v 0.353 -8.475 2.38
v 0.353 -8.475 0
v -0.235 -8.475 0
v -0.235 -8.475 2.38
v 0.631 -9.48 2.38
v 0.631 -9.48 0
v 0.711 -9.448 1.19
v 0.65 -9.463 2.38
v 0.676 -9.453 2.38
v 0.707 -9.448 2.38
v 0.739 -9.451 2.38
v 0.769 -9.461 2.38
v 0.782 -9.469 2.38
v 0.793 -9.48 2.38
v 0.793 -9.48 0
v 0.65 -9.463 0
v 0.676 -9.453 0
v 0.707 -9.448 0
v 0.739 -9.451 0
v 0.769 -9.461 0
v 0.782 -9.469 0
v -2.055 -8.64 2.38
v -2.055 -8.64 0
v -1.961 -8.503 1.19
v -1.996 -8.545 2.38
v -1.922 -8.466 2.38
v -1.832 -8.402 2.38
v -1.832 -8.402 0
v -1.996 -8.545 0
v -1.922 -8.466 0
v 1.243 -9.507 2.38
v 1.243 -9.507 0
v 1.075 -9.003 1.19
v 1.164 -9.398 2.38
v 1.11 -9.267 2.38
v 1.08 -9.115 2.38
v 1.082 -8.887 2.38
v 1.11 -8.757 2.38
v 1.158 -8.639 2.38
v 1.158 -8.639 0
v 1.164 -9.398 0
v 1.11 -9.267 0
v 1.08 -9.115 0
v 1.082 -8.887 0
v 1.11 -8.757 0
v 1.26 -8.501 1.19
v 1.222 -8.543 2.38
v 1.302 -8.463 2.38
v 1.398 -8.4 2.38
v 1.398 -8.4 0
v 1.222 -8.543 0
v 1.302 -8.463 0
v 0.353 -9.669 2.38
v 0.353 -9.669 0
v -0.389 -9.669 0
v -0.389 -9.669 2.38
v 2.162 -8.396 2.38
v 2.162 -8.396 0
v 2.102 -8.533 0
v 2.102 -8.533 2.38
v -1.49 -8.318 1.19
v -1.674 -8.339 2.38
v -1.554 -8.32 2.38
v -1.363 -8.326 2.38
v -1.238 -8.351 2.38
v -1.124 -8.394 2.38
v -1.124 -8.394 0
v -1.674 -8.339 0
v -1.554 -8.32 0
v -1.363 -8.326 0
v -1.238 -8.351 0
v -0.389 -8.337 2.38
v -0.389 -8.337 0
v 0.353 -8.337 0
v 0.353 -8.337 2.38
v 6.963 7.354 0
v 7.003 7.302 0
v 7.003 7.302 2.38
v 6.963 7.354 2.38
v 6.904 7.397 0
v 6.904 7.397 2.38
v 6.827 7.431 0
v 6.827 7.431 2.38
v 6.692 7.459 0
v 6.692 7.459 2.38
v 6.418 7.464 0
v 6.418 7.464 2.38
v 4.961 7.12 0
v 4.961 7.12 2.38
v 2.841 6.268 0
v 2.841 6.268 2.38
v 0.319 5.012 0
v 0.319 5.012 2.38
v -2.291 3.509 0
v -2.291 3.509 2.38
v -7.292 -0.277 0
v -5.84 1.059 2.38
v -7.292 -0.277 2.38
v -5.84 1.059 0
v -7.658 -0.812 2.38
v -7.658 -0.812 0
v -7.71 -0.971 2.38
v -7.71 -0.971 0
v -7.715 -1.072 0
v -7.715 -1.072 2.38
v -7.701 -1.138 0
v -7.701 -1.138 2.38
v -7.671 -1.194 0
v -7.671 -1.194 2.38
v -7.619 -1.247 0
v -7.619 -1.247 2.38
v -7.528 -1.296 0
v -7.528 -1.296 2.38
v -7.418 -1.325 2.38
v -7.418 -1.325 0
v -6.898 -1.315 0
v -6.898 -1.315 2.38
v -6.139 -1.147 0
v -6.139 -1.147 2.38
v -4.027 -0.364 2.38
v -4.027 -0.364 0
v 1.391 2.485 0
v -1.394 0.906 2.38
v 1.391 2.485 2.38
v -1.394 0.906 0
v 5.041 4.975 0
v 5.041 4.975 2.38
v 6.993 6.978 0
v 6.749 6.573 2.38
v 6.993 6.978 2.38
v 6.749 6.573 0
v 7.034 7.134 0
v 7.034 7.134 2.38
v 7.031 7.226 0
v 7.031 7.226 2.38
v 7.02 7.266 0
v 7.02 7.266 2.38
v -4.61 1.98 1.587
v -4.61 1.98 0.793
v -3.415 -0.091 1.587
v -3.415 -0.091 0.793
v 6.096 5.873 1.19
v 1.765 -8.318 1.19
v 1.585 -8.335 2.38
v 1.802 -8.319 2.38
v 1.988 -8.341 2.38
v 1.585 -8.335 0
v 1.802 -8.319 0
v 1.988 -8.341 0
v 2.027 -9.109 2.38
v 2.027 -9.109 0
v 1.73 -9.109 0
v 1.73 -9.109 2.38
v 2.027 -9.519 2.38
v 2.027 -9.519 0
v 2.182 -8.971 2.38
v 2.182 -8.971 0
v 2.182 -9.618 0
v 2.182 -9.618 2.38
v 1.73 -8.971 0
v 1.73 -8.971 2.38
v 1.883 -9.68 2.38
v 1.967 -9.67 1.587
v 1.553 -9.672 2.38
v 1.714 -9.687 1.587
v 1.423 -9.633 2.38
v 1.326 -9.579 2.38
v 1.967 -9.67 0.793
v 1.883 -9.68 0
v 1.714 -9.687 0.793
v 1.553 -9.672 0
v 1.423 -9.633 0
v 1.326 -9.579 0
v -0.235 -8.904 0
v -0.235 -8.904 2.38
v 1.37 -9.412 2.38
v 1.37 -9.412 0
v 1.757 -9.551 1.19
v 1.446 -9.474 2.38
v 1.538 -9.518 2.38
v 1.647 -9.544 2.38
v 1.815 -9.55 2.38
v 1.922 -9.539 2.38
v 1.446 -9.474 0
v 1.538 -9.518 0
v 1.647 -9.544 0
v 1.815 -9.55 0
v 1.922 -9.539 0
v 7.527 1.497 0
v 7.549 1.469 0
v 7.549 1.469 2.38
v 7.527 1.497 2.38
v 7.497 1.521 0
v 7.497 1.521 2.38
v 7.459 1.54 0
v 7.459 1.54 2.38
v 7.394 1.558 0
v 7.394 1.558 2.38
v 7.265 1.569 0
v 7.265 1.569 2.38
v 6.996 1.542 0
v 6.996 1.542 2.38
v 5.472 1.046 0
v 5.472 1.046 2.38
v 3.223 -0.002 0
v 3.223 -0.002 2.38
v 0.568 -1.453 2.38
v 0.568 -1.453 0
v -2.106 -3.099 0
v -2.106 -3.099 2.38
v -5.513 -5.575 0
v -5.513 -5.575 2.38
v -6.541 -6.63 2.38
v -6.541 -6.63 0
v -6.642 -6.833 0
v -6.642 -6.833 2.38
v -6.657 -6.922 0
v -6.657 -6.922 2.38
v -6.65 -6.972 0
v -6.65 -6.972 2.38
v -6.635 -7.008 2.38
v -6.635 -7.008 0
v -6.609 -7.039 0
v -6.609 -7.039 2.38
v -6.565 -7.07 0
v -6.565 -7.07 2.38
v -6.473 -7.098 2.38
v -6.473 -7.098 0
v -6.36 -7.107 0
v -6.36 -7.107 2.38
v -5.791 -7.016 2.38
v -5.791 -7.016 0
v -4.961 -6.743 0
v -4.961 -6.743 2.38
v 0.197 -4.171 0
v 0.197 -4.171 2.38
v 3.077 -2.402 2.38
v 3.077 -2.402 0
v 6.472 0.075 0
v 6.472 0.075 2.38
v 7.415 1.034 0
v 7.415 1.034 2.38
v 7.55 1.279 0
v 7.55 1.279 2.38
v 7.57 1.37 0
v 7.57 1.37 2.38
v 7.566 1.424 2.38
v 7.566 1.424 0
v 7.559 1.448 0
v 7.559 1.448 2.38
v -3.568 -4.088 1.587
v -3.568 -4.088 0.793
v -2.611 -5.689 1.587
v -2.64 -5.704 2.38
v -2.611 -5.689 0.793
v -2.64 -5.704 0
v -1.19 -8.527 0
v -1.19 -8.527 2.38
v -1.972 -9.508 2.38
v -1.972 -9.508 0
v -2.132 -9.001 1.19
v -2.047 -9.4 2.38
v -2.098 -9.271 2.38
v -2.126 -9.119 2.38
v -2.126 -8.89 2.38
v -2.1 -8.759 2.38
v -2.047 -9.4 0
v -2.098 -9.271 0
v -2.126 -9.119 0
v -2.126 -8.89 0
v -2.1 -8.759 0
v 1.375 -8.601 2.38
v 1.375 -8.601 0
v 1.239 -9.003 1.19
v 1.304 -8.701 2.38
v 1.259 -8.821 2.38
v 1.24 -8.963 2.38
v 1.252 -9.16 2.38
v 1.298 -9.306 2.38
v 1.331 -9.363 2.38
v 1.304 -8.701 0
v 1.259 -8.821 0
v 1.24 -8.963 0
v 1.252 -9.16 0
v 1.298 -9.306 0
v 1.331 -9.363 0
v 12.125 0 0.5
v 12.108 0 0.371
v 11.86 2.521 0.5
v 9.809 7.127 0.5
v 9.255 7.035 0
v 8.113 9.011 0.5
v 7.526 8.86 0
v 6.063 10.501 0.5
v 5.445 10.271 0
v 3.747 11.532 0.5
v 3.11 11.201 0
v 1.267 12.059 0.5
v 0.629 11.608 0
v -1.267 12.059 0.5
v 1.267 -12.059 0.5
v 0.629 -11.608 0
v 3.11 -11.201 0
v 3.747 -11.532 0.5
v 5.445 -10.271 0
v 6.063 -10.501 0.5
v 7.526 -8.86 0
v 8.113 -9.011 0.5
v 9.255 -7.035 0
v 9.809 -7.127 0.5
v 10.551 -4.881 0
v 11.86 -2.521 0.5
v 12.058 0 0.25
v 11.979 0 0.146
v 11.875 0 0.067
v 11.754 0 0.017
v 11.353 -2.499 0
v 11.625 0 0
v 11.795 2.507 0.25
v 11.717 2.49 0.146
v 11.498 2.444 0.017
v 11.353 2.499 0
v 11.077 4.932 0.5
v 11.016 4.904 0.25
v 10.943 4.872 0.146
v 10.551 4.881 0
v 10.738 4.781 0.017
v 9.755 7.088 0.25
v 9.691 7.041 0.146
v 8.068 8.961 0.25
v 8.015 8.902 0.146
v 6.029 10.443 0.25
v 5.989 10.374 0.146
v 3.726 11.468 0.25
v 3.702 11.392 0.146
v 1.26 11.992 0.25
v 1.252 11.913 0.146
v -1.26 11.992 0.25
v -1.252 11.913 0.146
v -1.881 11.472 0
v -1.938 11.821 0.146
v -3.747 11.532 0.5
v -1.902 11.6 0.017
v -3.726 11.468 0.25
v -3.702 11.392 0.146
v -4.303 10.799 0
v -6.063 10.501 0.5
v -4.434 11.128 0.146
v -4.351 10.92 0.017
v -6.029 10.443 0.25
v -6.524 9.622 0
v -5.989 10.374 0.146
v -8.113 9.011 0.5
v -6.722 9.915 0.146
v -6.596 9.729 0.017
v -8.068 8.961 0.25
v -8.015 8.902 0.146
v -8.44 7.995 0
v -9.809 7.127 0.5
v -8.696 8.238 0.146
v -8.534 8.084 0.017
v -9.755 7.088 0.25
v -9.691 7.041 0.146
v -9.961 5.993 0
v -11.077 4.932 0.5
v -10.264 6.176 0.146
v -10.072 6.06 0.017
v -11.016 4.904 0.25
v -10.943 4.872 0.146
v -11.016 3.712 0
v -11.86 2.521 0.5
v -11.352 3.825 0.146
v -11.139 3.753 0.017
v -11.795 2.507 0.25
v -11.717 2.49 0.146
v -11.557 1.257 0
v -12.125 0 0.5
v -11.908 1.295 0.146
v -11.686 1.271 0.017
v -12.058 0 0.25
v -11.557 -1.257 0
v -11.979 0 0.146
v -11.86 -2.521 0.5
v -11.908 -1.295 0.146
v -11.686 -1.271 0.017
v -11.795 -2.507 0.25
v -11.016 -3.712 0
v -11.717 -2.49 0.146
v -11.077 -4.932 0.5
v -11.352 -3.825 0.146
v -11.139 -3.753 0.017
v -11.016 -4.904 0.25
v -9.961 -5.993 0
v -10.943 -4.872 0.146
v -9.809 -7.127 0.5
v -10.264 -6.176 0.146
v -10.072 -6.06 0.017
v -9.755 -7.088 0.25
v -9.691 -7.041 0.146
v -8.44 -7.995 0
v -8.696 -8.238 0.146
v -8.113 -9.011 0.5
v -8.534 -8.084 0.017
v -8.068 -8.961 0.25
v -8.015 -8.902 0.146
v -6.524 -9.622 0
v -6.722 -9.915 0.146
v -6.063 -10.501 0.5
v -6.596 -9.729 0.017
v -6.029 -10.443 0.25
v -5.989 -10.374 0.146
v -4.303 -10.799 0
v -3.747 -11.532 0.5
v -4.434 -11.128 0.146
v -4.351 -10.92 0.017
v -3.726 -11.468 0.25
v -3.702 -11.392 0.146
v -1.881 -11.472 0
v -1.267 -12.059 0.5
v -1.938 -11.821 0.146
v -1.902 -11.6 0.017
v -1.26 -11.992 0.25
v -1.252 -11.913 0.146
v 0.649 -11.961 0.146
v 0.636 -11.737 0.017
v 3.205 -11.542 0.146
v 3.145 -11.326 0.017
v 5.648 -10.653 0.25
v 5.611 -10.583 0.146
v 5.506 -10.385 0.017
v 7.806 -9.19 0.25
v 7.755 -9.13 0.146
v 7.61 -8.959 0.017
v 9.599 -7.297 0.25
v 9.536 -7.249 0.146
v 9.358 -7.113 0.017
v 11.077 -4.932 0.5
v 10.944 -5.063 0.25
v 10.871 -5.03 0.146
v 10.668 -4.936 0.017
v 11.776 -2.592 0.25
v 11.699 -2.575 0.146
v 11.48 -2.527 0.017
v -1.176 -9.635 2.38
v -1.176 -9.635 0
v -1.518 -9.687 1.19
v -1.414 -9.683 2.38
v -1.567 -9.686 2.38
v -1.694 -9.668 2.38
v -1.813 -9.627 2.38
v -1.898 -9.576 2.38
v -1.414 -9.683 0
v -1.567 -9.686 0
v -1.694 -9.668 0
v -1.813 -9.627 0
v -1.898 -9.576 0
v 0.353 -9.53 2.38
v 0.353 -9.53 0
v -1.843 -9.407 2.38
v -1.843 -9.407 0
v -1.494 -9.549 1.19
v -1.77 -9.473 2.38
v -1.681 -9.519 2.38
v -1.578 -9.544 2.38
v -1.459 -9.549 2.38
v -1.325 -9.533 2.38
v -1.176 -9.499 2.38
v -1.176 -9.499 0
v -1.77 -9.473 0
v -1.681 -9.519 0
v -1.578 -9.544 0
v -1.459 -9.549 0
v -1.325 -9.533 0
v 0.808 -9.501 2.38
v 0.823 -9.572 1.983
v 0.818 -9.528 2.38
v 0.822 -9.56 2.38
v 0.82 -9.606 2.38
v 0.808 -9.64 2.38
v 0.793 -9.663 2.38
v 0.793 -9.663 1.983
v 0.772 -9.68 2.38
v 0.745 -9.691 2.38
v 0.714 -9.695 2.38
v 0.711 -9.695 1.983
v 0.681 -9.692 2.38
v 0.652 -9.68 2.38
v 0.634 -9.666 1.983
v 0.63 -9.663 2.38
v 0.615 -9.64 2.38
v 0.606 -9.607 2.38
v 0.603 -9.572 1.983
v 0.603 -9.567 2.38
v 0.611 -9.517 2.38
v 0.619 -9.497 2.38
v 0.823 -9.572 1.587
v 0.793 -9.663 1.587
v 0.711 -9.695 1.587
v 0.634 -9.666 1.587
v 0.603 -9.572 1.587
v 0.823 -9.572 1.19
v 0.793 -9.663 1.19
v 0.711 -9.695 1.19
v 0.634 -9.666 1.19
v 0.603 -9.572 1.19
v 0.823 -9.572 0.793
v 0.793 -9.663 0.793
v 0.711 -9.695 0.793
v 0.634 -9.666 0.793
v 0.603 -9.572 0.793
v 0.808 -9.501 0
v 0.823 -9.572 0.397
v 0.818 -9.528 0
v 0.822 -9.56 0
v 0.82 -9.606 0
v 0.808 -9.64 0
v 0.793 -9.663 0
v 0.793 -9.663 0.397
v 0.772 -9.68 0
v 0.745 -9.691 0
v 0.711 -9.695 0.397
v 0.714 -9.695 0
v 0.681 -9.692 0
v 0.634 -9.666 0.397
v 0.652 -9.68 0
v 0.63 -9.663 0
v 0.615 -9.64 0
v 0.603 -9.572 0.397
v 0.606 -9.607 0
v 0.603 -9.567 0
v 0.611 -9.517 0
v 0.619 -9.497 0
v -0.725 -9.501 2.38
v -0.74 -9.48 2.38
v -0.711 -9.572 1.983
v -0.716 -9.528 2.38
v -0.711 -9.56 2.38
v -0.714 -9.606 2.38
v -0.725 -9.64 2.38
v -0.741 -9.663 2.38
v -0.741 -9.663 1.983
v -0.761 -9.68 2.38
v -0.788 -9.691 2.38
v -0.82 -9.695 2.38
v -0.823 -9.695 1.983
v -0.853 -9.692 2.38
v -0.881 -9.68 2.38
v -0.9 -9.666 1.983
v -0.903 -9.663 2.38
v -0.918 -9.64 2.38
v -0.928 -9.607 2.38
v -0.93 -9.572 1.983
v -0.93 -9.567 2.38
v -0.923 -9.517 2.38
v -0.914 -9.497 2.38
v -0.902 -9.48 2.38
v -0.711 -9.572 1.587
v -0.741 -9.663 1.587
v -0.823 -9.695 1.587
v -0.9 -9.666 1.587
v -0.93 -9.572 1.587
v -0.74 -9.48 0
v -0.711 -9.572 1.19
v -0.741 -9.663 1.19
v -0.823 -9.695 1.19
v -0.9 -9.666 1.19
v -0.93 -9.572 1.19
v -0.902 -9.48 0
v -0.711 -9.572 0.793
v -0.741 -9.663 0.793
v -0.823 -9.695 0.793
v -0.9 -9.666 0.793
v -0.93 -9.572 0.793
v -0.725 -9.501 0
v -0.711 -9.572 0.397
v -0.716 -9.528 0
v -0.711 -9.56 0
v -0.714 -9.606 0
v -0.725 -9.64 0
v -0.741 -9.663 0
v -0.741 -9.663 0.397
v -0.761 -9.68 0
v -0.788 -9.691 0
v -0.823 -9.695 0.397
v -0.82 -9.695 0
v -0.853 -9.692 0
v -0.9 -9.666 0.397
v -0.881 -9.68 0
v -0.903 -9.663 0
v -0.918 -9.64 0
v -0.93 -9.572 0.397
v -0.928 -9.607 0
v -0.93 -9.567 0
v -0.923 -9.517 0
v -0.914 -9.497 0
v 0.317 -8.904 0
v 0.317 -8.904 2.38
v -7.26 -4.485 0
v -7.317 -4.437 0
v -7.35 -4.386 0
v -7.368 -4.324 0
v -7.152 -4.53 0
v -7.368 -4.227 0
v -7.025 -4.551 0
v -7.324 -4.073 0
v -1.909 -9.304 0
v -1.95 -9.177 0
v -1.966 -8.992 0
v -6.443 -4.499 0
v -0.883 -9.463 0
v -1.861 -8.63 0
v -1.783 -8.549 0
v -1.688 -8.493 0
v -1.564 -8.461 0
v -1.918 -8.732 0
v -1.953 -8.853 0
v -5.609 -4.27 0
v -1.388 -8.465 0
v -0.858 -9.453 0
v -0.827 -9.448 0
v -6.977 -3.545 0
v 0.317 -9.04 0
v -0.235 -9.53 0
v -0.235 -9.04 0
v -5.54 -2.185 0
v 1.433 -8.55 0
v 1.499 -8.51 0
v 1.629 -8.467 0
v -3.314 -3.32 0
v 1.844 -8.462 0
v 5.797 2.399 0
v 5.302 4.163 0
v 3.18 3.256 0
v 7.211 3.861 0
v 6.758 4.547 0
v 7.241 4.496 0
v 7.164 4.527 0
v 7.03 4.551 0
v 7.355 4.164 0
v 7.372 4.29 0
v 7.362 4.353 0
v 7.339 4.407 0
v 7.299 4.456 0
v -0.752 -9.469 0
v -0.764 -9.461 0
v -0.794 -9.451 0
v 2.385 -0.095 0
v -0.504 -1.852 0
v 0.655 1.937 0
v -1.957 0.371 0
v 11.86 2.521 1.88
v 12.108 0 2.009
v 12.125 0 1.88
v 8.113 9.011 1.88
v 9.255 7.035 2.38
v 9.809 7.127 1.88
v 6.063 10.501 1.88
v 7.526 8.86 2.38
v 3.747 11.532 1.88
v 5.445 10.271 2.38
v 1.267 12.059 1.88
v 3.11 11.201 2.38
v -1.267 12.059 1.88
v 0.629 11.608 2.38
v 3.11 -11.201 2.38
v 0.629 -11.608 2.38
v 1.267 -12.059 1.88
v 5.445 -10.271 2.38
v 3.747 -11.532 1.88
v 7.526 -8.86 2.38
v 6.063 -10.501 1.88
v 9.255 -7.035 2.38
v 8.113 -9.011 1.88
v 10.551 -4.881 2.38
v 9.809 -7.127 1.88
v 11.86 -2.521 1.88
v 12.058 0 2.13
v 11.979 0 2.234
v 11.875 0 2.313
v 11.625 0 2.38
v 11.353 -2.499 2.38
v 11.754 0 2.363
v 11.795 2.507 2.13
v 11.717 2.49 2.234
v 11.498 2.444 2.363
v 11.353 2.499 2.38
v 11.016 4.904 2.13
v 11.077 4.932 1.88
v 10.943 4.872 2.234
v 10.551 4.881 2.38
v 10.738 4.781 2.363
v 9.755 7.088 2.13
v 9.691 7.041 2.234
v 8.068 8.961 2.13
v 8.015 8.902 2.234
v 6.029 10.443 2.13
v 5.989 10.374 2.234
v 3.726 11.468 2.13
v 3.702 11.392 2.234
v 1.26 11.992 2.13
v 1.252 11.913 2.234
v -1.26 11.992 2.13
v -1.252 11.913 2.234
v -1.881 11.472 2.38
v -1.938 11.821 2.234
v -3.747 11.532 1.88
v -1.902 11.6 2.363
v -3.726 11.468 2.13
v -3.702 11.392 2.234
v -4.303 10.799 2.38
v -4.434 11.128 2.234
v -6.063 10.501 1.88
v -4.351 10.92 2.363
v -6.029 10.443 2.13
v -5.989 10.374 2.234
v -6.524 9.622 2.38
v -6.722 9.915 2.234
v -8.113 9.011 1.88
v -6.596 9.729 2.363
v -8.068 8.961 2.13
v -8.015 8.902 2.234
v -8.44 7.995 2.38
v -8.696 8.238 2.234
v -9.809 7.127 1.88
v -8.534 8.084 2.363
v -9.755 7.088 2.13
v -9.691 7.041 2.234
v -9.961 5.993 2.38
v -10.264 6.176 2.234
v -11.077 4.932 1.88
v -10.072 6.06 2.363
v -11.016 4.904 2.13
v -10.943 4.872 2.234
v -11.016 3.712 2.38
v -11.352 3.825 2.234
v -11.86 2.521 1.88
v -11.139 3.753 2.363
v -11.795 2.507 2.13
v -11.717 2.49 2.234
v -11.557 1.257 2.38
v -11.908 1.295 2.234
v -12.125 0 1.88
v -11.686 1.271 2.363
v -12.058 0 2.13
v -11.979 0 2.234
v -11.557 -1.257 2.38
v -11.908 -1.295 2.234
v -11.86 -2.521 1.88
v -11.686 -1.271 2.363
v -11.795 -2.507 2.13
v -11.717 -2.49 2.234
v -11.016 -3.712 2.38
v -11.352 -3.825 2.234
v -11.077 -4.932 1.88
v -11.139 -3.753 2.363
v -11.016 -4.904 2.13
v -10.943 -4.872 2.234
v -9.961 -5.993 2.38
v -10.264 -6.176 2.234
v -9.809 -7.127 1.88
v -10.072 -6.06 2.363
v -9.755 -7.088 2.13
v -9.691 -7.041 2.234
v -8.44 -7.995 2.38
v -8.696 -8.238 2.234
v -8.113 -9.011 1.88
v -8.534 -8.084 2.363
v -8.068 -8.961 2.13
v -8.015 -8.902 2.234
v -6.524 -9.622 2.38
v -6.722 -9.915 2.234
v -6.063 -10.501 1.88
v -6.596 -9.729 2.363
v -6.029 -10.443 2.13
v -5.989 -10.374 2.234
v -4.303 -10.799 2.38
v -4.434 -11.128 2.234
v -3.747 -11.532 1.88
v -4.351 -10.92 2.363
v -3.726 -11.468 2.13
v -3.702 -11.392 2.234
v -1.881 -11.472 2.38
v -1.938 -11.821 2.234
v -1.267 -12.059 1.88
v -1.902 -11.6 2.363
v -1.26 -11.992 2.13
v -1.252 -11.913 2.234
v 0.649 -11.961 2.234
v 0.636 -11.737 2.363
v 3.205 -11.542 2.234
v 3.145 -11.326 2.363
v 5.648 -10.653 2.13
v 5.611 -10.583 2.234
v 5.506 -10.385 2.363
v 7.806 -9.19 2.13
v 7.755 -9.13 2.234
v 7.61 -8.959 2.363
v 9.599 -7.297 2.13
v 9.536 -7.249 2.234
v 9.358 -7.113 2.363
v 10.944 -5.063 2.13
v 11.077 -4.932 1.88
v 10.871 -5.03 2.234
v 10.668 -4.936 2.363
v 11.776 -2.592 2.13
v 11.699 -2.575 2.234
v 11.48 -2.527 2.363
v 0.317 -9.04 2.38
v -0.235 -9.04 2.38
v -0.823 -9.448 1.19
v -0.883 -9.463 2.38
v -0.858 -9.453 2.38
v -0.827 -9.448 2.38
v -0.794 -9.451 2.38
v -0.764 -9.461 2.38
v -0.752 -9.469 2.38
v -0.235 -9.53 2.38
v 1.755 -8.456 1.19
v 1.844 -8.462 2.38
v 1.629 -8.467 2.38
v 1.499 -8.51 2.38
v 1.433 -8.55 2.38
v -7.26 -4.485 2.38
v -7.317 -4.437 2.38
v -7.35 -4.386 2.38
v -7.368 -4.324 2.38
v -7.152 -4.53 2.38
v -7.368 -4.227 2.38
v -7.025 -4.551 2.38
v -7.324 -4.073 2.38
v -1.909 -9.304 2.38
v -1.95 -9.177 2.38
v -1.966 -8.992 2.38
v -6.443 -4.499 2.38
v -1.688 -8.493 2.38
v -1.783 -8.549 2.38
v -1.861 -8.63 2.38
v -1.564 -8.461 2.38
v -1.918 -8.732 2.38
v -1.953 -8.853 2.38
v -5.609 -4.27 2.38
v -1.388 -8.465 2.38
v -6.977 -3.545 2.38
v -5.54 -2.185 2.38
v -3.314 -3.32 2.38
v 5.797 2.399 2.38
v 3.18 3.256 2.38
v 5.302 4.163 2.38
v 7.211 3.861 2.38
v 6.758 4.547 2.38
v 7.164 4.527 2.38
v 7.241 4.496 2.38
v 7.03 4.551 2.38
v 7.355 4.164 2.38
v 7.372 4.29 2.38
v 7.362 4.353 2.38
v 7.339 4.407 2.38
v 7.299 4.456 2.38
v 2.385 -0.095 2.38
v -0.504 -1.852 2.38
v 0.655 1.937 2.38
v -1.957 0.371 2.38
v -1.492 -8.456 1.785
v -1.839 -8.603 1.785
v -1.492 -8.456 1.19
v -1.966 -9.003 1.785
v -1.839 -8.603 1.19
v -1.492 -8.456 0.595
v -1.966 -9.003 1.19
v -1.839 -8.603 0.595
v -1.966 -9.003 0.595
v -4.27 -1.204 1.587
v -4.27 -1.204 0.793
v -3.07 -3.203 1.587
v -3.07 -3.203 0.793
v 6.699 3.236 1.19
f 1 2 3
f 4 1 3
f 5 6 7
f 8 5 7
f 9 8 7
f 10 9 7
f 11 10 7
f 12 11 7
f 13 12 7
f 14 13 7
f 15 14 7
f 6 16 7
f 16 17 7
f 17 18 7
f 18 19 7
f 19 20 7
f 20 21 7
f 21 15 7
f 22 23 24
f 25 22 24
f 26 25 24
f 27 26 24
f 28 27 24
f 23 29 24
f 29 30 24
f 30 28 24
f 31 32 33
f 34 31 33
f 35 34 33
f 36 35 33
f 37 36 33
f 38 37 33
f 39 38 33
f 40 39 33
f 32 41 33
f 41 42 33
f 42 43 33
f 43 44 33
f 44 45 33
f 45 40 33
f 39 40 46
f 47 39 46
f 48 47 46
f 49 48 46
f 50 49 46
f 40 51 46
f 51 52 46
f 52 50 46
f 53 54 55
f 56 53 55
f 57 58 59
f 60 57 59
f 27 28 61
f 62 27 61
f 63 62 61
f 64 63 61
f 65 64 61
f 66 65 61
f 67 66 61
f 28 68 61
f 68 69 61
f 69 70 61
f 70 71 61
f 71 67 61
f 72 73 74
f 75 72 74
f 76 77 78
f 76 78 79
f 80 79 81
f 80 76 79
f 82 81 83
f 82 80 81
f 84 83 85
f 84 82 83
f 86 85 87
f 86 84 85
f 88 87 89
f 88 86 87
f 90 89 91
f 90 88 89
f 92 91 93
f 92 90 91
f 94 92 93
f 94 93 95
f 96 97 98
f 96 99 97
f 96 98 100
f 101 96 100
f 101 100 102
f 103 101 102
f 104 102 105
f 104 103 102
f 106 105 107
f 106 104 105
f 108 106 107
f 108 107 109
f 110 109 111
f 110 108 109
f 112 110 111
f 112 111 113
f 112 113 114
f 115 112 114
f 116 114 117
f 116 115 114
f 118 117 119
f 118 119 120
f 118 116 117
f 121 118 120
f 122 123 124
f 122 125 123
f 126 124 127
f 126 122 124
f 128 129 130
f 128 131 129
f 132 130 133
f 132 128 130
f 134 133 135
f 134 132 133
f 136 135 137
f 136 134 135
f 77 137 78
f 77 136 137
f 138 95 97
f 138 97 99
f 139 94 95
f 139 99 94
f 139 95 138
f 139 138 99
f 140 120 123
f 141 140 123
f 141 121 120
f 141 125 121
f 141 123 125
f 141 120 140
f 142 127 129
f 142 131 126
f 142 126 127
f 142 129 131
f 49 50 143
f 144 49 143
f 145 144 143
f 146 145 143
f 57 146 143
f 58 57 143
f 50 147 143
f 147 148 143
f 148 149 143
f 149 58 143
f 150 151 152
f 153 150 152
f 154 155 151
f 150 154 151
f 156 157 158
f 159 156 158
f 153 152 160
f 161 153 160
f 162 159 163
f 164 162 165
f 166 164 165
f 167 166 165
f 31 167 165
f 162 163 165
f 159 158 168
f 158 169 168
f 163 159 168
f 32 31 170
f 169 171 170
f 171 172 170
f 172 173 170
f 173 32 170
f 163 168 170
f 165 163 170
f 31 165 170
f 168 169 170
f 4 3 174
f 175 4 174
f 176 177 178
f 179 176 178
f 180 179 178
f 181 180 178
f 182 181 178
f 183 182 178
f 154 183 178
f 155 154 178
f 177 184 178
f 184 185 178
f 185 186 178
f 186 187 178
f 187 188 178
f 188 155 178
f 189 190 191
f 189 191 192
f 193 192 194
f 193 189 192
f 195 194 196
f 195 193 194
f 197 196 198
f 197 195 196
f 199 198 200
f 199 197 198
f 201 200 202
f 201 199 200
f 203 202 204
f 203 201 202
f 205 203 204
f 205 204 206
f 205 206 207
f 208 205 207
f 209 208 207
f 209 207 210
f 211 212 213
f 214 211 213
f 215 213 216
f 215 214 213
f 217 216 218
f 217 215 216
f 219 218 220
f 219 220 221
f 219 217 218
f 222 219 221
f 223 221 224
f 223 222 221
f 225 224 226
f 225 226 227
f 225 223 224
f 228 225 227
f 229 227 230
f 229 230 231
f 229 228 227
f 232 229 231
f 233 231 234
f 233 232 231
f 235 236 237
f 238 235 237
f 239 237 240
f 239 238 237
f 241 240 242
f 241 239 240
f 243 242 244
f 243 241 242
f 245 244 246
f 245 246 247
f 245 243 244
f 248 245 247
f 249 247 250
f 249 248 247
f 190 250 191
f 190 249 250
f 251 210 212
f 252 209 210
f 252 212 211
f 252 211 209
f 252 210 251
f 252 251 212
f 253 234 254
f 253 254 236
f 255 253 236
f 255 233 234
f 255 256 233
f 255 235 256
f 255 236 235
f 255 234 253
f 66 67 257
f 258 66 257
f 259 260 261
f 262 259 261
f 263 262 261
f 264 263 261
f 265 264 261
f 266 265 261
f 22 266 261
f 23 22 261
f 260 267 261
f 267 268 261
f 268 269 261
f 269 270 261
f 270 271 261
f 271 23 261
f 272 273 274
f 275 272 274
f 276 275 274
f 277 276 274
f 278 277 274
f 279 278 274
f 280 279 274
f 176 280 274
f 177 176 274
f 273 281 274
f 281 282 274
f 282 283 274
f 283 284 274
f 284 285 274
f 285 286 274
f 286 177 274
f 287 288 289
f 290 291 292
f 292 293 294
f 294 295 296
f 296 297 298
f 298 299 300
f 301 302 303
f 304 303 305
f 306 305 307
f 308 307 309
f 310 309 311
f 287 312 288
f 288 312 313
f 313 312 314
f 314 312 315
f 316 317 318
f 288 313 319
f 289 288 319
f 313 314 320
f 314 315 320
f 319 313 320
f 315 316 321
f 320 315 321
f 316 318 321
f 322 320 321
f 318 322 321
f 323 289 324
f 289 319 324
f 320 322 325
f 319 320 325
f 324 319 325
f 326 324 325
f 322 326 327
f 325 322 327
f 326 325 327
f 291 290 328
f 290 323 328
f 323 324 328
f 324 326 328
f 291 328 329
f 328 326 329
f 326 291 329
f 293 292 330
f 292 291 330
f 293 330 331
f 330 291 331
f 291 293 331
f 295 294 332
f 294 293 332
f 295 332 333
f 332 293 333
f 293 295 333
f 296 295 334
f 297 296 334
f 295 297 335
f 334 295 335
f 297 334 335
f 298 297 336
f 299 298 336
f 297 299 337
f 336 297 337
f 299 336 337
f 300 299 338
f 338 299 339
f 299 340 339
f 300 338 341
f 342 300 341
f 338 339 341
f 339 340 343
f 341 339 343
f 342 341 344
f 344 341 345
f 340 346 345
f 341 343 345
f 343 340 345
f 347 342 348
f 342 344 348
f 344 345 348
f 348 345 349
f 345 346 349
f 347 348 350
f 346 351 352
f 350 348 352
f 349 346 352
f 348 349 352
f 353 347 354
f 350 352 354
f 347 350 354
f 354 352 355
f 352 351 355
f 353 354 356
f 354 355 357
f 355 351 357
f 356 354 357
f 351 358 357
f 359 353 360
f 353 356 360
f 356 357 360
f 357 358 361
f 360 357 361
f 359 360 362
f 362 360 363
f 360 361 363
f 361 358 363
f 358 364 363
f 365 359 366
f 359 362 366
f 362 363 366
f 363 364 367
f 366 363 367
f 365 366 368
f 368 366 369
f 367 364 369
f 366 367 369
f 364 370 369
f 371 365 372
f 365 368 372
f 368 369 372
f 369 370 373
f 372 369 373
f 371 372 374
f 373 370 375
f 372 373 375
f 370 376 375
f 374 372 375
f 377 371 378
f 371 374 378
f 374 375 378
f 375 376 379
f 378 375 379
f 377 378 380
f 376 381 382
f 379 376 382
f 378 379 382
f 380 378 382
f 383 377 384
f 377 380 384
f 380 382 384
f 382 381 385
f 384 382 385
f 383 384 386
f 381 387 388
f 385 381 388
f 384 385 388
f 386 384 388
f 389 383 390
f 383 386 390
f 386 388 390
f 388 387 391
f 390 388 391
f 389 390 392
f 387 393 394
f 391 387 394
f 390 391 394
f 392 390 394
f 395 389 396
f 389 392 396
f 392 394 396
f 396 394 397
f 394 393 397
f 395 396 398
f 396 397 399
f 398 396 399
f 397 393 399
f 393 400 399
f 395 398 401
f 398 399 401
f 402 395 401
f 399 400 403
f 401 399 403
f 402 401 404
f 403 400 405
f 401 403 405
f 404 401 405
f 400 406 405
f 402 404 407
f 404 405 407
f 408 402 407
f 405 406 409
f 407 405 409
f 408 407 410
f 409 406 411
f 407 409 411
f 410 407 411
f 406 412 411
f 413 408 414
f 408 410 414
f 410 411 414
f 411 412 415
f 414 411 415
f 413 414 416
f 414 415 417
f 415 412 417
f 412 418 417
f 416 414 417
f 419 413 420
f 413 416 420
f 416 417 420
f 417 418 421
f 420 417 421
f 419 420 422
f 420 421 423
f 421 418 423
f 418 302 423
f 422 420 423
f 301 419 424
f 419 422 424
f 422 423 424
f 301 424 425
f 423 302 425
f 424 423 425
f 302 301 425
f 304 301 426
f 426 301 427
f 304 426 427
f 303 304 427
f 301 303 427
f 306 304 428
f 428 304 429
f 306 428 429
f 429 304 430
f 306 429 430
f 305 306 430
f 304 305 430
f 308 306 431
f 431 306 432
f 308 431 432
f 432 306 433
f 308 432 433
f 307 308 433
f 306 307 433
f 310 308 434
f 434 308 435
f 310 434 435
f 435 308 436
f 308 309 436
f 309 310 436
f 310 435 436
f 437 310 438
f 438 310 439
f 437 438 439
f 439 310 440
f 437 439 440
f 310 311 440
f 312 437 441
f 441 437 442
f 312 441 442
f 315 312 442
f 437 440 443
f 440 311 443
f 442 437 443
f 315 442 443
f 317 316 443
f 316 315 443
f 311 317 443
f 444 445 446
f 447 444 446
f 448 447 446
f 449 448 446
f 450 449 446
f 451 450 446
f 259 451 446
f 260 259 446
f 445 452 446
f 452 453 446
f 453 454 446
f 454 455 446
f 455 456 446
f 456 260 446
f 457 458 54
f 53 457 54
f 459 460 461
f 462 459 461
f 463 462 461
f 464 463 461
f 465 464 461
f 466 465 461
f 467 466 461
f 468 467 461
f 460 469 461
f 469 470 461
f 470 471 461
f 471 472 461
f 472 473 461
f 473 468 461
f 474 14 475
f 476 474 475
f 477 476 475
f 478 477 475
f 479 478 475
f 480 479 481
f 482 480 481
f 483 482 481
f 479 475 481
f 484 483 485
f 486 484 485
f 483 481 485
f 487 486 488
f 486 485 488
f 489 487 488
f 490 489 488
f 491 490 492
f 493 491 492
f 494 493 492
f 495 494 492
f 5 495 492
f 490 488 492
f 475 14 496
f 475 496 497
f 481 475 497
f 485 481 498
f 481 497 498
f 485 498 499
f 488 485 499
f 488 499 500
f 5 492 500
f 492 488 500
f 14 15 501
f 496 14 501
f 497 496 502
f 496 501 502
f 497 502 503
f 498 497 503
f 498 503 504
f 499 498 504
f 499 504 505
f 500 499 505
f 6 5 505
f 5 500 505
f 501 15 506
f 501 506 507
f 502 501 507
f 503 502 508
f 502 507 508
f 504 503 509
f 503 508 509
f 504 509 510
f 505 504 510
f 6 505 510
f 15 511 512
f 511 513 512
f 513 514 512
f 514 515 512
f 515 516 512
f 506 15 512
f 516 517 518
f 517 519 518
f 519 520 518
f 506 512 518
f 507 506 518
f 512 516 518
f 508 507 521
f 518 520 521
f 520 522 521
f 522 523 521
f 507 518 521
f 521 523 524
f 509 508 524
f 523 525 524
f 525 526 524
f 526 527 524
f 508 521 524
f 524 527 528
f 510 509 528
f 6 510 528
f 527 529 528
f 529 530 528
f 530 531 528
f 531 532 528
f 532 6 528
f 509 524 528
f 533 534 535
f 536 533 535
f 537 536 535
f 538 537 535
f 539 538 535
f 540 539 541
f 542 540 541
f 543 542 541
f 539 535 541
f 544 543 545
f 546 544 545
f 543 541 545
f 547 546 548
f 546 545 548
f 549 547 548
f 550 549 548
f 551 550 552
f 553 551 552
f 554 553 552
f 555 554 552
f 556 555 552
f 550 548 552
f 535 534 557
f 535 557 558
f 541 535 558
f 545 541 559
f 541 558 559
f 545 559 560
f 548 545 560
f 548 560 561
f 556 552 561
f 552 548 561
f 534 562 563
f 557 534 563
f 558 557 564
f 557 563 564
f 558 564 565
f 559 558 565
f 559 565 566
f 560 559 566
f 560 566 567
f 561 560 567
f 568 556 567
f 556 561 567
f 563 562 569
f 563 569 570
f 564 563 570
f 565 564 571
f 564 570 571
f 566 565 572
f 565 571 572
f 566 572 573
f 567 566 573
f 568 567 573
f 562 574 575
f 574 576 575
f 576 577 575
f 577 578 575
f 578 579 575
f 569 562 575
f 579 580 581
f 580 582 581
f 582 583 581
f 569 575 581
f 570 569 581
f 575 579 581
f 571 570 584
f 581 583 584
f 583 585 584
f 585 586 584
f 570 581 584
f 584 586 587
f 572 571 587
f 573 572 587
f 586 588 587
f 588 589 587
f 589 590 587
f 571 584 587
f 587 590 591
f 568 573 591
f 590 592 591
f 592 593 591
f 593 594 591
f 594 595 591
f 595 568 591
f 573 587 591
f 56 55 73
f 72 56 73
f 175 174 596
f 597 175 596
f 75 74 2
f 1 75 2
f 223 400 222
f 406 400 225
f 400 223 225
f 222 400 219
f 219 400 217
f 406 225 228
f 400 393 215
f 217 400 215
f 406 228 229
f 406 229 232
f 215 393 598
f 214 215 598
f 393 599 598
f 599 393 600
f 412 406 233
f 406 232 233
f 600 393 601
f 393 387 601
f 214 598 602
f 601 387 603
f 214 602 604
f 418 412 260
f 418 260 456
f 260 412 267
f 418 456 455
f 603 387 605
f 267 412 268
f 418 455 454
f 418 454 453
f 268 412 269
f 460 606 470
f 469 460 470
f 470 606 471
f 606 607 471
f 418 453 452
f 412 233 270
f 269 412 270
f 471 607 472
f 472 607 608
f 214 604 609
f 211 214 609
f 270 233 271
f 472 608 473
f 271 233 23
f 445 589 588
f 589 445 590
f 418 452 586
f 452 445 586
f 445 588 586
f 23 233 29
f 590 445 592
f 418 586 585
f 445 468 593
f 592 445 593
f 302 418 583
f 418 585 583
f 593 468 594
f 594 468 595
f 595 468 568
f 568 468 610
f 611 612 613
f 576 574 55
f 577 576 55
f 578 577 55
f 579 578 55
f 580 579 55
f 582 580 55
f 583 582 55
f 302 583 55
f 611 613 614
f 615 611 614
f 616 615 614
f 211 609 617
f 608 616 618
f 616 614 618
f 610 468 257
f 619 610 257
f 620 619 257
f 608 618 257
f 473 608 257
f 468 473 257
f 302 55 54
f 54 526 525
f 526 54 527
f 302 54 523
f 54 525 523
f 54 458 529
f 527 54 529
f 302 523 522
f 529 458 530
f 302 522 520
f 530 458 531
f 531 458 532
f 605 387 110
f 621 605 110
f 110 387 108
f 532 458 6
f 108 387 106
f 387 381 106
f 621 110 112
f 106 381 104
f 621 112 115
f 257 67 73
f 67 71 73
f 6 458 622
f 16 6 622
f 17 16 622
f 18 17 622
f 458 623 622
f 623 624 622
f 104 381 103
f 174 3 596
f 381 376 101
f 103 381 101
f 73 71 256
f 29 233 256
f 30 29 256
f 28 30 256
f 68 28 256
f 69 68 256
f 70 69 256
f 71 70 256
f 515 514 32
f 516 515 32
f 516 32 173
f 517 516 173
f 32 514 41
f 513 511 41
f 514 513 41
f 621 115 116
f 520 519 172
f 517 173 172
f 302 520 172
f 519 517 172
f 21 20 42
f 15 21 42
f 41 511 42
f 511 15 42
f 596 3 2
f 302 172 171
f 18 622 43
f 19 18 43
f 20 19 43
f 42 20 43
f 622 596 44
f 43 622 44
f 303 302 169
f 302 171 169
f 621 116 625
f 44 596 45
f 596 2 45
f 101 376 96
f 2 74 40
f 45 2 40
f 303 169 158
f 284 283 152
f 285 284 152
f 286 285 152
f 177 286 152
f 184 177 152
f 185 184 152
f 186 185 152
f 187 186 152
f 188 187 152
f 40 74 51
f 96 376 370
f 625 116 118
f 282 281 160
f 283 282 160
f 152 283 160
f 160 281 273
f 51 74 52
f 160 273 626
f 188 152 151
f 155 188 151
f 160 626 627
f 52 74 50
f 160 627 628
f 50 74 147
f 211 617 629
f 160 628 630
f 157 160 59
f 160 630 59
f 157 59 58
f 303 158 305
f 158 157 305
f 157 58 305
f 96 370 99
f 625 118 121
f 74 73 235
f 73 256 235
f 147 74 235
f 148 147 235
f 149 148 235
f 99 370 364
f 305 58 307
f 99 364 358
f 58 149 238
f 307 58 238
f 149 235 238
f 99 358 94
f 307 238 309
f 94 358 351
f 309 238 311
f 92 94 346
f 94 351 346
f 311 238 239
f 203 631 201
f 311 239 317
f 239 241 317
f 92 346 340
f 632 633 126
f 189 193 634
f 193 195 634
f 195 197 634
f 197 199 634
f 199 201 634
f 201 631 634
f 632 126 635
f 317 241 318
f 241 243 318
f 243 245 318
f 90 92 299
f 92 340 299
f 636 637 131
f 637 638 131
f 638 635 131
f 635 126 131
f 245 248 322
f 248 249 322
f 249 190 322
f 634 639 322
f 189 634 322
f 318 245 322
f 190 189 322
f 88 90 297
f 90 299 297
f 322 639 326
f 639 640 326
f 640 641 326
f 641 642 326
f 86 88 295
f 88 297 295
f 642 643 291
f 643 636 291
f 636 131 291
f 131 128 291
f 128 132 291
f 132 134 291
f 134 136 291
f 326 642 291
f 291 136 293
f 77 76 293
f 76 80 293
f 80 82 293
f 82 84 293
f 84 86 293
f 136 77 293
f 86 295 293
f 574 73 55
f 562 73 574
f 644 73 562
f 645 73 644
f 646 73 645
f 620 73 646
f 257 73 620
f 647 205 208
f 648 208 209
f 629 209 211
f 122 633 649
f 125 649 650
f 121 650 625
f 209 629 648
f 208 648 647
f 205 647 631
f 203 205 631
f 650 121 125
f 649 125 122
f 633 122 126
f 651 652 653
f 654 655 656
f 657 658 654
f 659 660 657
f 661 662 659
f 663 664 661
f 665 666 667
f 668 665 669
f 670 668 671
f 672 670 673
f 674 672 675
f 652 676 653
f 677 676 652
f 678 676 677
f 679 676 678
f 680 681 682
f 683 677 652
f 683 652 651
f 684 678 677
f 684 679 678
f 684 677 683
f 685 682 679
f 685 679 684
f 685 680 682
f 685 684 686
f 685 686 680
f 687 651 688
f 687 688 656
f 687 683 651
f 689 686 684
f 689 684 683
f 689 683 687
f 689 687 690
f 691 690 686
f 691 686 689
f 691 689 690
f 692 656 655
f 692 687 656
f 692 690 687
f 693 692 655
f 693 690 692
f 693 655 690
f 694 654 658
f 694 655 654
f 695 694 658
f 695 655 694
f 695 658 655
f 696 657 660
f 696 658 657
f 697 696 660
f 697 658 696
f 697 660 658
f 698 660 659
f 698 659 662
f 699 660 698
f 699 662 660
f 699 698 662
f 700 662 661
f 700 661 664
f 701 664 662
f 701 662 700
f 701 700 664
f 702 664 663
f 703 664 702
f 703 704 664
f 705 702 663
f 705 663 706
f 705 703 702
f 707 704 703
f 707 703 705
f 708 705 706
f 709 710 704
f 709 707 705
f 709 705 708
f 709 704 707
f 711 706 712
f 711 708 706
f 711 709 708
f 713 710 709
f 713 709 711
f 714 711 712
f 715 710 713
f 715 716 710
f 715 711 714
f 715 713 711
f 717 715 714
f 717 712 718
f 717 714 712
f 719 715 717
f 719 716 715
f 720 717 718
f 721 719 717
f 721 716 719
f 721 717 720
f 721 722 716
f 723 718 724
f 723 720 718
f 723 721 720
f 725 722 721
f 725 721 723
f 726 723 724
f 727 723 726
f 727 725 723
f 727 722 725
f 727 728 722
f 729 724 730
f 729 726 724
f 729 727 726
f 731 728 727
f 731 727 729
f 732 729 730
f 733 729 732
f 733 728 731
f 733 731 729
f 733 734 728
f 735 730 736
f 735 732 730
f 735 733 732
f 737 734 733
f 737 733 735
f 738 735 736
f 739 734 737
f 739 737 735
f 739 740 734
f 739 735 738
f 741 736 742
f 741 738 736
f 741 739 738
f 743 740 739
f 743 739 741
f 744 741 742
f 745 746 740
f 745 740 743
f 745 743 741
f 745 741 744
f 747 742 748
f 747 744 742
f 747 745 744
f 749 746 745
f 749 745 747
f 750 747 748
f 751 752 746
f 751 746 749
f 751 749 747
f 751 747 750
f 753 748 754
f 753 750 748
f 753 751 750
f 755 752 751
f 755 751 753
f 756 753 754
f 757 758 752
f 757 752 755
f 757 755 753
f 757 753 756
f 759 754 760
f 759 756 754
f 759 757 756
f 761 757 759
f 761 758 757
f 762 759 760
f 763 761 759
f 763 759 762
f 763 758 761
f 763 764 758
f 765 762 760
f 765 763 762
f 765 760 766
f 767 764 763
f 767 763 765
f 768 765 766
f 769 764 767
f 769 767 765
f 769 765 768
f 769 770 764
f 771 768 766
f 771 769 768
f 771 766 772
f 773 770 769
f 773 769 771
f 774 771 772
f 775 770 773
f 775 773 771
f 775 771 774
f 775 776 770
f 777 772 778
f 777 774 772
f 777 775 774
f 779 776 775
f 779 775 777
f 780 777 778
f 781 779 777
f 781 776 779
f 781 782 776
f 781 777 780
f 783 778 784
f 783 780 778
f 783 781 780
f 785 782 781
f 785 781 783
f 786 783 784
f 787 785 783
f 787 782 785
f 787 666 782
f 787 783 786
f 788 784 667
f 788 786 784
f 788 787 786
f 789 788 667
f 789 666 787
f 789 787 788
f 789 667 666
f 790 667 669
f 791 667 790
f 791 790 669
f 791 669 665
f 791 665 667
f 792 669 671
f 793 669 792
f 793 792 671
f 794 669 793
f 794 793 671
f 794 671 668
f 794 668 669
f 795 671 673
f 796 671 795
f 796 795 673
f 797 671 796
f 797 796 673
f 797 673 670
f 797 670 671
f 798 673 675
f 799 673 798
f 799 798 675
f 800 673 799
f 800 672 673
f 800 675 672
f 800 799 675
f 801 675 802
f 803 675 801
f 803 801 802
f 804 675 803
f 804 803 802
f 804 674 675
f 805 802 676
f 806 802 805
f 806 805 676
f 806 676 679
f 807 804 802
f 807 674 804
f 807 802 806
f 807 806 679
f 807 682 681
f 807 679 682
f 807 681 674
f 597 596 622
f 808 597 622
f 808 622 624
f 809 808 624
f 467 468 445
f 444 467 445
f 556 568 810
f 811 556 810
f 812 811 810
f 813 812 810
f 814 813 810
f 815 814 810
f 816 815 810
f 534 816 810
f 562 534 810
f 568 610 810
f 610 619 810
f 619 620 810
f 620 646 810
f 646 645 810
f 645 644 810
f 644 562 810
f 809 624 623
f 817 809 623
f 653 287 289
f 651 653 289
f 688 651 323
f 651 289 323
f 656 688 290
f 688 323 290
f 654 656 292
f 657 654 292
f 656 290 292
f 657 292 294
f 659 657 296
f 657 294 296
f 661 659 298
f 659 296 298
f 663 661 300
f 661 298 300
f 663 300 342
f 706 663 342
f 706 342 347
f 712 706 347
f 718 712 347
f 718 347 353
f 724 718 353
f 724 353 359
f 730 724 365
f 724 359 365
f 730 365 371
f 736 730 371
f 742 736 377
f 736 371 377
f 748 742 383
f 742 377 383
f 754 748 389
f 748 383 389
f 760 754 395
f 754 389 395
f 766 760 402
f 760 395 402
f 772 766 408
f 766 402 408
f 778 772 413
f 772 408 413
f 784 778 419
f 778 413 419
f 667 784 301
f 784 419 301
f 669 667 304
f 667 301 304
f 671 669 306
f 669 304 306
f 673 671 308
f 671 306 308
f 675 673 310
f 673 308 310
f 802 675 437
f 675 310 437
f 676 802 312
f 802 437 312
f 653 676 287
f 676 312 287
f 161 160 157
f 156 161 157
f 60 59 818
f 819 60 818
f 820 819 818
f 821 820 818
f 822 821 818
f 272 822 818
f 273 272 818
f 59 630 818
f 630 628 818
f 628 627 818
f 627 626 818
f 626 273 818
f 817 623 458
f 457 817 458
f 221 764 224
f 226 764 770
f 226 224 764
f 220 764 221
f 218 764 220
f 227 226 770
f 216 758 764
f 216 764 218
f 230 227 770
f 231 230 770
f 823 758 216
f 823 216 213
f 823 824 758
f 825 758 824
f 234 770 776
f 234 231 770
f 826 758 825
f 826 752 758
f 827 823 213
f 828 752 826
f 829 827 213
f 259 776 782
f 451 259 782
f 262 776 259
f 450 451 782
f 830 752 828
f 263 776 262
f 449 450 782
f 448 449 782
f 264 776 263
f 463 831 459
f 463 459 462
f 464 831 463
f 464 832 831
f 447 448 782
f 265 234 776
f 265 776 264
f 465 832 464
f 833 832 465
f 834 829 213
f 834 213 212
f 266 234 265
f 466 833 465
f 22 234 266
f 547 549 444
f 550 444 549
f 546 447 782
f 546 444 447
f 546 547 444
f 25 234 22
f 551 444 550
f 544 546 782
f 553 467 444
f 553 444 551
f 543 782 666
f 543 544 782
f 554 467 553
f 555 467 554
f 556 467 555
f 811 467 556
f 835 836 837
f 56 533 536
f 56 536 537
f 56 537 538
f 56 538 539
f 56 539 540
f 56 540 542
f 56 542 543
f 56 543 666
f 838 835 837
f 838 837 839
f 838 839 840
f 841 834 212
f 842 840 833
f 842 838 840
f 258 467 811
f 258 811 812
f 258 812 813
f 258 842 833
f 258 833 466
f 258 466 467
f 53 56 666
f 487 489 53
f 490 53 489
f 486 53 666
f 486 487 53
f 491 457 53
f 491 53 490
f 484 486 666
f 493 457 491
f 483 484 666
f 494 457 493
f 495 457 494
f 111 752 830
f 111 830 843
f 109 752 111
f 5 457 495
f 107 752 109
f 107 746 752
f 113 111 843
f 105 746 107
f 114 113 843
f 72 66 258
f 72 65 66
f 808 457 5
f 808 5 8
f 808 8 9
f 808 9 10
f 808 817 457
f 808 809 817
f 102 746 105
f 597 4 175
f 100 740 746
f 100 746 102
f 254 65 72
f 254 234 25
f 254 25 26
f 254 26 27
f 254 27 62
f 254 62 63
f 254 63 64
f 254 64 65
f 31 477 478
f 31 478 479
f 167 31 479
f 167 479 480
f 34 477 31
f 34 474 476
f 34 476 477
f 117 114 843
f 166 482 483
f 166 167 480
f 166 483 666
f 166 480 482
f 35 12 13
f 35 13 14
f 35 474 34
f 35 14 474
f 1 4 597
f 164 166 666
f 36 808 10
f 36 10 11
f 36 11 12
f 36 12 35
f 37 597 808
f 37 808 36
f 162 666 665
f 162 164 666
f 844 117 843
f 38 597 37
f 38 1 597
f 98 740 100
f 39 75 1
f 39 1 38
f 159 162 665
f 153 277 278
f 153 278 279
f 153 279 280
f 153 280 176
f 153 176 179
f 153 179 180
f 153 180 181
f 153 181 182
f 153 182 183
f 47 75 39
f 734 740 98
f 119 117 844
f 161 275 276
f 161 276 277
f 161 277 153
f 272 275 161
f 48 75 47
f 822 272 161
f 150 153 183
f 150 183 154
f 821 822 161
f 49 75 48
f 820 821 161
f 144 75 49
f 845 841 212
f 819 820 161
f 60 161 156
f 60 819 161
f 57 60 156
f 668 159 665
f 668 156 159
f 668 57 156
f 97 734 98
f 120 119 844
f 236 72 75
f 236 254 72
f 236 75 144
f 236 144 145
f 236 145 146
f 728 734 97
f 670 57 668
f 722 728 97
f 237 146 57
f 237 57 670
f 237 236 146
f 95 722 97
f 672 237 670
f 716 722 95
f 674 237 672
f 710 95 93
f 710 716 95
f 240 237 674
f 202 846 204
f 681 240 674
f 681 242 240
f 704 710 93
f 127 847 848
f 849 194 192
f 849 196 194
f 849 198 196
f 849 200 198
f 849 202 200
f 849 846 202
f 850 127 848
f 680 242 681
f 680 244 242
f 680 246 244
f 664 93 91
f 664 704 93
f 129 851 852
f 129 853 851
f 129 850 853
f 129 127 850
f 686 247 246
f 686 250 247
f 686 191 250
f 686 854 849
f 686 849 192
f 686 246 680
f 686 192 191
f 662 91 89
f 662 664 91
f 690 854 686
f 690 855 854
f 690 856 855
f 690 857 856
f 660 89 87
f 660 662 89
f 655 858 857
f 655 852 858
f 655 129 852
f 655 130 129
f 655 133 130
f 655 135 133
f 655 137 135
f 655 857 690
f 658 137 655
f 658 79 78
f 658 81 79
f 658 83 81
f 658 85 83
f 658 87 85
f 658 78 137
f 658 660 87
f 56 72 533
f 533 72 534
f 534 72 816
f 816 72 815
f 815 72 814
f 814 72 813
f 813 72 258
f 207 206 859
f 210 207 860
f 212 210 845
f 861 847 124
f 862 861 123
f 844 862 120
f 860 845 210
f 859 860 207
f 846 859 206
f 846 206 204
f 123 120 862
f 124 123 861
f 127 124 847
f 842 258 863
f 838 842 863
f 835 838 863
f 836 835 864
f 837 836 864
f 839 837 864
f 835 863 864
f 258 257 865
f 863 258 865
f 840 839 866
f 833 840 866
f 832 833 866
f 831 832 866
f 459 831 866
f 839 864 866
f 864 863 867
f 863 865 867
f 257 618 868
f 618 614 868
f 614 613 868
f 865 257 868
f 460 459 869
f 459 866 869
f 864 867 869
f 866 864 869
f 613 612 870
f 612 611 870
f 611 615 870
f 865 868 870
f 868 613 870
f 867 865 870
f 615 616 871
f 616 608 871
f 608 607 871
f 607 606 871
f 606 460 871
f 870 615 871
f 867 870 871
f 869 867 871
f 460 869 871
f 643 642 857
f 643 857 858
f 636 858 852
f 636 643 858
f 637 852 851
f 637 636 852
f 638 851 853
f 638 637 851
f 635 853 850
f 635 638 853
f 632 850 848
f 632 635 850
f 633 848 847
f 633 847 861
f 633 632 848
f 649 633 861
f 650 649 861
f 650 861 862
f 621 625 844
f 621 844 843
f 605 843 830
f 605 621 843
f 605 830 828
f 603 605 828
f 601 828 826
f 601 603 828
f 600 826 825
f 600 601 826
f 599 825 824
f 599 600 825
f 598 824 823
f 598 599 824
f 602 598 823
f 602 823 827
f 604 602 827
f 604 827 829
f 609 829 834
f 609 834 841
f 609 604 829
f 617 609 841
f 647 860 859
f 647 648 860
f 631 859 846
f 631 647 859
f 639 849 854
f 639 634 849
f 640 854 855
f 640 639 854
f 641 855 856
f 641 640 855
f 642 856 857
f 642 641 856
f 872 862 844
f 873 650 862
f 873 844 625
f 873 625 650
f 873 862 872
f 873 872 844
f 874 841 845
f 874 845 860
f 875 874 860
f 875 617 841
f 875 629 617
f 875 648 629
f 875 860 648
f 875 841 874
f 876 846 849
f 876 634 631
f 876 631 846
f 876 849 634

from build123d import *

# Parameters (mm, degrees)
F1_R     = 12.125
F2_DEPTH = 2.38
F3_R     = 0.5


with BuildPart() as f2:
    # F1 (on Top) → F2 (new body)
    with BuildSketch(Plane.XY):
        Circle(F1_R)
        with BuildLine():
            add(Edge.make_bspline(
                [(-0.8998456912, -9.666339638), (-0.9302993652, -9.6376345003), (-0.9302993652, -9.5720643888)],
                knots=[0, 0, 0, 1, 1, 1], degree=2))
            add(Edge.make_bspline(
                [(-0.9302993652, -9.5720643888), (-0.9302993652, -9.5108656181), (-0.9024684956, -9.479537676)],
                knots=[0, 0, 0, 1, 1, 1], degree=2))
            add(Edge.make_bspline(
                [(-0.9024684956, -9.479537676), (-0.8746376261, -9.4482097338), (-0.8227643824, -9.4482097338)],
                knots=[0, 0, 0, 1, 1, 1], degree=2))
            add(Edge.make_bspline(
                [(-0.8227643824, -9.4482097338), (-0.7700168705, -9.4482097338), (-0.7404374646, -9.479537676)],
                knots=[0, 0, 0, 1, 1, 1], degree=2))
            add(Edge.make_bspline(
                [(-0.7404374646, -9.479537676), (-0.7108580588, -9.5108656181), (-0.7108580588, -9.5720643888)],
                knots=[0, 0, 0, 1, 1, 1], degree=2))
            add(Edge.make_bspline(
                [(-0.7108580588, -9.5720643888), (-0.7108580588, -9.6312232005), (-0.7408745987, -9.6631339881)],
                knots=[0, 0, 0, 1, 1, 1], degree=2))
            add(Edge.make_bspline(
                [(-0.7408745987, -9.6631339881), (-0.7708911386, -9.6950447757), (-0.8227643824, -9.6950447757)],
                knots=[0, 0, 0, 1, 1, 1], degree=2))
            add(Edge.make_bspline(
                [(-0.8227643824, -9.6950447757), (-0.8693920172, -9.6950447757), (-0.8998456912, -9.666339638)],
                knots=[0, 0, 0, 1, 1, 1], degree=2))
        make_face(mode=Mode.SUBTRACT)
        with BuildLine():
            add(Edge.make_bspline(
                [(-1.1899570066, -8.527313946), (-1.3412053971, -8.4564982256), (-1.4924537876, -8.4564982256)],
                knots=[0, 0, 0, 1, 1, 1], degree=2))
            add(Edge.make_bspline(
                [(-1.4924537876, -8.4564982256), (-1.711895094, -8.4564982256), (-1.8389553989, -8.6026467185)],
                knots=[0, 0, 0, 1, 1, 1], degree=2))
            add(Edge.make_bspline(
                [(-1.8389553989, -8.6026467185), (-1.9660157038, -8.7487952114), (-1.9660157038, -9.0029158212)],
                knots=[0, 0, 0, 1, 1, 1], degree=2))
            add(Edge.make_bspline(
                [(-1.9660157038, -9.0029158212), (-1.9660157038, -9.2640305763), (-1.843472451, -9.4066819966)],
                knots=[0, 0, 0, 1, 1, 1], degree=2))
            add(Edge.make_bspline(
                [(-1.843472451, -9.4066819966), (-1.7209291982, -9.5493334168), (-1.4942023239, -9.5493334168)],
                knots=[0, 0, 0, 1, 1, 1], degree=2))
            add(Edge.make_bspline(
                [(-1.4942023239, -9.5493334168), (-1.3549022648, -9.5493334168), (-1.1762601389, -9.4992087094)],
                knots=[0, 0, 0, 1, 1, 1], degree=2))
            Line((-1.1762601389, -9.4992087094), (-1.1762601389, -9.6347202731))
            add(Edge.make_bspline(
                [(-1.1762601389, -9.6347202731), (-1.3146859298, -9.6868849396), (-1.517807564, -9.6868849396)],
                knots=[0, 0, 0, 1, 1, 1], degree=2))
            add(Edge.make_bspline(
                [(-1.517807564, -9.6868849396), (-1.8118530861, -9.6868849396), (-1.9716984467, -9.5082428137)],
                knots=[0, 0, 0, 1, 1, 1], degree=2))
            add(Edge.make_bspline(
                [(-1.9716984467, -9.5082428137), (-2.1315438074, -9.3296006877), (-2.1315438074, -9.0008758622)],
                knots=[0, 0, 0, 1, 1, 1], degree=2))
            add(Edge.make_bspline(
                [(-2.1315438074, -9.0008758622), (-2.1315438074, -8.7951314235), (-2.0546082099, -8.6403859605)],
                knots=[0, 0, 0, 1, 1, 1], degree=2))
            add(Edge.make_bspline(
                [(-2.0546082099, -8.6403859605), (-1.9776726125, -8.4856404974), (-1.8323983877, -8.4018564661)],
                knots=[0, 0, 0, 1, 1, 1], degree=2))
            add(Edge.make_bspline(
                [(-1.8323983877, -8.4018564661), (-1.687124163, -8.3180724347), (-1.4904138285, -8.3180724347)],
                knots=[0, 0, 0, 1, 1, 1], degree=2))
            add(Edge.make_bspline(
                [(-1.4904138285, -8.3180724347), (-1.2811723172, -8.3180724347), (-1.1243868951, -8.3944251868)],
                knots=[0, 0, 0, 1, 1, 1], degree=2))
            Line((-1.1243868951, -8.3944251868), (-1.1899570066, -8.527313946))
        make_face(mode=Mode.SUBTRACT)
        Polygon((0.3528348607, -9.5300995175), (0.3528348607, -9.6685253084), (-0.3894188012, -9.6685253084), (-0.3894188012, -8.3370149114), (0.3528348607, -8.3370149114), (0.3528348607, -8.4745664341), (-0.2346733381, -8.4745664341), (-0.2346733381, -8.9035406745), (0.3172812891, -8.9035406745), (0.3172812891, -9.0402179291), (-0.2346733381, -9.0402179291), (-0.2346733381, -9.5300995175), align=None, mode=Mode.SUBTRACT)
        with BuildLine():
            add(Edge.make_bspline(
                [(0.6336206491, -9.666339638), (0.6031669751, -9.6376345003), (0.6031669751, -9.5720643888)],
                knots=[0, 0, 0, 1, 1, 1], degree=2))
            add(Edge.make_bspline(
                [(0.6031669751, -9.5720643888), (0.6031669751, -9.5108656181), (0.6309978447, -9.479537676)],
                knots=[0, 0, 0, 1, 1, 1], degree=2))
            add(Edge.make_bspline(
                [(0.6309978447, -9.479537676), (0.6588287142, -9.4482097338), (0.710701958, -9.4482097338)],
                knots=[0, 0, 0, 1, 1, 1], degree=2))
            add(Edge.make_bspline(
                [(0.710701958, -9.4482097338), (0.7634494699, -9.4482097338), (0.7930288757, -9.479537676)],
                knots=[0, 0, 0, 1, 1, 1], degree=2))
            add(Edge.make_bspline(
                [(0.7930288757, -9.479537676), (0.8226082815, -9.5108656181), (0.8226082815, -9.5720643888)],
                knots=[0, 0, 0, 1, 1, 1], degree=2))
            add(Edge.make_bspline(
                [(0.8226082815, -9.5720643888), (0.8226082815, -9.6312232005), (0.7925917416, -9.6631339881)],
                knots=[0, 0, 0, 1, 1, 1], degree=2))
            add(Edge.make_bspline(
                [(0.7925917416, -9.6631339881), (0.7625752017, -9.6950447757), (0.710701958, -9.6950447757)],
                knots=[0, 0, 0, 1, 1, 1], degree=2))
            add(Edge.make_bspline(
                [(0.710701958, -9.6950447757), (0.6640743231, -9.6950447757), (0.6336206491, -9.666339638)],
                knots=[0, 0, 0, 1, 1, 1], degree=2))
        make_face(mode=Mode.SUBTRACT)
        with BuildLine():
            Line((1.7298072016, -9.1092851132), (1.7298072016, -8.9708593223))
            Line((1.7298072016, -8.9708593223), (2.1823866822, -8.9708593223))
            Line((2.1823866822, -8.9708593223), (2.1823866822, -9.6184006009))
            add(Edge.make_bspline(
                [(2.1823866822, -9.6184006009), (2.0766002356, -9.6522056362), (1.9673167165, -9.6695452879)],
                knots=[0, 0, 0, 1, 1, 1], degree=2))
            add(Edge.make_bspline(
                [(1.9673167165, -9.6695452879), (1.8580331974, -9.6868849396), (1.7140703749, -9.6868849396)],
                knots=[0, 0, 0, 1, 1, 1], degree=2))
            add(Edge.make_bspline(
                [(1.7140703749, -9.6868849396), (1.4118650167, -9.6868849396), (1.2434226859, -9.5069314114)],
                knots=[0, 0, 0, 1, 1, 1], degree=2))
            add(Edge.make_bspline(
                [(1.2434226859, -9.5069314114), (1.074980355, -9.3269778833), (1.074980355, -9.0029158212)],
                knots=[0, 0, 0, 1, 1, 1], degree=2))
            add(Edge.make_bspline(
                [(1.074980355, -9.0029158212), (1.074980355, -8.7951314235), (1.1583272523, -8.6389288469)],
                knots=[0, 0, 0, 1, 1, 1], degree=2))
            add(Edge.make_bspline(
                [(1.1583272523, -8.6389288469), (1.2416741495, -8.4827262702), (1.3983138603, -8.4003993525)],
                knots=[0, 0, 0, 1, 1, 1], degree=2))
            add(Edge.make_bspline(
                [(1.3983138603, -8.4003993525), (1.554953571, -8.3180724347), (1.7650693505, -8.3180724347)],
                knots=[0, 0, 0, 1, 1, 1], degree=2))
            add(Edge.make_bspline(
                [(1.7650693505, -8.3180724347), (1.9783907798, -8.3180724347), (2.1622785146, -8.3961737231)],
                knots=[0, 0, 0, 1, 1, 1], degree=2))
            Line((2.1622785146, -8.3961737231), (2.1022454348, -8.5328509776))
            add(Edge.make_bspline(
                [(2.1022454348, -8.5328509776), (1.9218547726, -8.4564982256), (1.7551609781, -8.4564982256)],
                knots=[0, 0, 0, 1, 1, 1], degree=2))
            add(Edge.make_bspline(
                [(1.7551609781, -8.4564982256), (1.5121144315, -8.4564982256), (1.375437177, -8.6011896049)],
                knots=[0, 0, 0, 1, 1, 1], degree=2))
            add(Edge.make_bspline(
                [(1.375437177, -8.6011896049), (1.2387599224, -8.7458809843), (1.2387599224, -9.0029158212)],
                knots=[0, 0, 0, 1, 1, 1], degree=2))
            add(Edge.make_bspline(
                [(1.2387599224, -9.0029158212), (1.2387599224, -9.2724818351), (1.3703372794, -9.4117818941)],
                knots=[0, 0, 0, 1, 1, 1], degree=2))
            add(Edge.make_bspline(
                [(1.3703372794, -9.4117818941), (1.5019146364, -9.5510819532), (1.7569095144, -9.5510819532)],
                knots=[0, 0, 0, 1, 1, 1], degree=2))
            add(Edge.make_bspline(
                [(1.7569095144, -9.5510819532), (1.8953353053, -9.5510819532), (2.0273497964, -9.5190254542)],
                knots=[0, 0, 0, 1, 1, 1], degree=2))
            Line((2.0273497964, -9.5190254542), (2.0273497964, -9.1092851132))
            Line((2.0273497964, -9.1092851132), (1.7298072016, -9.1092851132))
        make_face(mode=Mode.SUBTRACT)
        with BuildLine():
            add(Edge.make_bspline(
                [(7.548970636, 1.469215611), (6.5921111767, 3.0702973064), (-3.5675583884, -4.0879240818), (-13.7272279535, -11.2461454701), (-2.6106989291, -5.6890057772), (8.5058300952, -0.1318660844), (7.548970636, 1.469215611)],
                knots=[0, 0, 0, 2.0943951024, 2.0943951024, 4.1887902048, 4.1887902048, 6.2831853072, 6.2831853072, 6.2831853072], degree=2, weights=[1, 0.5, 1, 0.5, 1, 0.5, 1]))
        make_face(mode=Mode.SUBTRACT)
        with BuildLine():
            add(Edge.make_bspline(
                [(7.0034274831, 7.3023349978), (5.8078204716, 9.373931465), (-4.6101599889, 1.9804526909), (-15.0281404494, -5.4130260833), (-3.4145529774, -0.0911437763), (8.1990344946, 5.2307385306), (7.0034274831, 7.3023349978)],
                knots=[0, 0, 0, 2.0943951024, 2.0943951024, 4.1887902048, 4.1887902048, 6.2831853072, 6.2831853072, 6.2831853072], degree=2, weights=[1, 0.5, 1, 0.5, 1, 0.5, 1]))
        make_face(mode=Mode.SUBTRACT)
        with BuildLine():
            add(Edge.make_bspline(
                [(7.3391464539, 4.4067576528), (6.1391810401, 6.4052160671), (-4.2695559338, -1.2041496192), (-14.6782929078, -8.8135153055), (-3.0695905201, -3.2026080335), (8.5391118676, 2.4082992384), (7.3391464539, 4.4067576528)],
                knots=[0, 0, 0, 2.0943951024, 2.0943951024, 4.1887902048, 4.1887902048, 6.2831853072, 6.2831853072, 6.2831853072], degree=2, weights=[1, 0.5, 1, 0.5, 1, 0.5, 1]))
        make_face(mode=Mode.SUBTRACT)
    extrude(amount=F2_DEPTH)

    # F3
    f3_edges = [f2.edges().sort_by_distance(p)[0] for p in [
        (-12.125, 0, 2.38),
        (-12.125, 0, 0),
    ]]
    fillet(f3_edges, radius=F3_R)


solid = f2.part
